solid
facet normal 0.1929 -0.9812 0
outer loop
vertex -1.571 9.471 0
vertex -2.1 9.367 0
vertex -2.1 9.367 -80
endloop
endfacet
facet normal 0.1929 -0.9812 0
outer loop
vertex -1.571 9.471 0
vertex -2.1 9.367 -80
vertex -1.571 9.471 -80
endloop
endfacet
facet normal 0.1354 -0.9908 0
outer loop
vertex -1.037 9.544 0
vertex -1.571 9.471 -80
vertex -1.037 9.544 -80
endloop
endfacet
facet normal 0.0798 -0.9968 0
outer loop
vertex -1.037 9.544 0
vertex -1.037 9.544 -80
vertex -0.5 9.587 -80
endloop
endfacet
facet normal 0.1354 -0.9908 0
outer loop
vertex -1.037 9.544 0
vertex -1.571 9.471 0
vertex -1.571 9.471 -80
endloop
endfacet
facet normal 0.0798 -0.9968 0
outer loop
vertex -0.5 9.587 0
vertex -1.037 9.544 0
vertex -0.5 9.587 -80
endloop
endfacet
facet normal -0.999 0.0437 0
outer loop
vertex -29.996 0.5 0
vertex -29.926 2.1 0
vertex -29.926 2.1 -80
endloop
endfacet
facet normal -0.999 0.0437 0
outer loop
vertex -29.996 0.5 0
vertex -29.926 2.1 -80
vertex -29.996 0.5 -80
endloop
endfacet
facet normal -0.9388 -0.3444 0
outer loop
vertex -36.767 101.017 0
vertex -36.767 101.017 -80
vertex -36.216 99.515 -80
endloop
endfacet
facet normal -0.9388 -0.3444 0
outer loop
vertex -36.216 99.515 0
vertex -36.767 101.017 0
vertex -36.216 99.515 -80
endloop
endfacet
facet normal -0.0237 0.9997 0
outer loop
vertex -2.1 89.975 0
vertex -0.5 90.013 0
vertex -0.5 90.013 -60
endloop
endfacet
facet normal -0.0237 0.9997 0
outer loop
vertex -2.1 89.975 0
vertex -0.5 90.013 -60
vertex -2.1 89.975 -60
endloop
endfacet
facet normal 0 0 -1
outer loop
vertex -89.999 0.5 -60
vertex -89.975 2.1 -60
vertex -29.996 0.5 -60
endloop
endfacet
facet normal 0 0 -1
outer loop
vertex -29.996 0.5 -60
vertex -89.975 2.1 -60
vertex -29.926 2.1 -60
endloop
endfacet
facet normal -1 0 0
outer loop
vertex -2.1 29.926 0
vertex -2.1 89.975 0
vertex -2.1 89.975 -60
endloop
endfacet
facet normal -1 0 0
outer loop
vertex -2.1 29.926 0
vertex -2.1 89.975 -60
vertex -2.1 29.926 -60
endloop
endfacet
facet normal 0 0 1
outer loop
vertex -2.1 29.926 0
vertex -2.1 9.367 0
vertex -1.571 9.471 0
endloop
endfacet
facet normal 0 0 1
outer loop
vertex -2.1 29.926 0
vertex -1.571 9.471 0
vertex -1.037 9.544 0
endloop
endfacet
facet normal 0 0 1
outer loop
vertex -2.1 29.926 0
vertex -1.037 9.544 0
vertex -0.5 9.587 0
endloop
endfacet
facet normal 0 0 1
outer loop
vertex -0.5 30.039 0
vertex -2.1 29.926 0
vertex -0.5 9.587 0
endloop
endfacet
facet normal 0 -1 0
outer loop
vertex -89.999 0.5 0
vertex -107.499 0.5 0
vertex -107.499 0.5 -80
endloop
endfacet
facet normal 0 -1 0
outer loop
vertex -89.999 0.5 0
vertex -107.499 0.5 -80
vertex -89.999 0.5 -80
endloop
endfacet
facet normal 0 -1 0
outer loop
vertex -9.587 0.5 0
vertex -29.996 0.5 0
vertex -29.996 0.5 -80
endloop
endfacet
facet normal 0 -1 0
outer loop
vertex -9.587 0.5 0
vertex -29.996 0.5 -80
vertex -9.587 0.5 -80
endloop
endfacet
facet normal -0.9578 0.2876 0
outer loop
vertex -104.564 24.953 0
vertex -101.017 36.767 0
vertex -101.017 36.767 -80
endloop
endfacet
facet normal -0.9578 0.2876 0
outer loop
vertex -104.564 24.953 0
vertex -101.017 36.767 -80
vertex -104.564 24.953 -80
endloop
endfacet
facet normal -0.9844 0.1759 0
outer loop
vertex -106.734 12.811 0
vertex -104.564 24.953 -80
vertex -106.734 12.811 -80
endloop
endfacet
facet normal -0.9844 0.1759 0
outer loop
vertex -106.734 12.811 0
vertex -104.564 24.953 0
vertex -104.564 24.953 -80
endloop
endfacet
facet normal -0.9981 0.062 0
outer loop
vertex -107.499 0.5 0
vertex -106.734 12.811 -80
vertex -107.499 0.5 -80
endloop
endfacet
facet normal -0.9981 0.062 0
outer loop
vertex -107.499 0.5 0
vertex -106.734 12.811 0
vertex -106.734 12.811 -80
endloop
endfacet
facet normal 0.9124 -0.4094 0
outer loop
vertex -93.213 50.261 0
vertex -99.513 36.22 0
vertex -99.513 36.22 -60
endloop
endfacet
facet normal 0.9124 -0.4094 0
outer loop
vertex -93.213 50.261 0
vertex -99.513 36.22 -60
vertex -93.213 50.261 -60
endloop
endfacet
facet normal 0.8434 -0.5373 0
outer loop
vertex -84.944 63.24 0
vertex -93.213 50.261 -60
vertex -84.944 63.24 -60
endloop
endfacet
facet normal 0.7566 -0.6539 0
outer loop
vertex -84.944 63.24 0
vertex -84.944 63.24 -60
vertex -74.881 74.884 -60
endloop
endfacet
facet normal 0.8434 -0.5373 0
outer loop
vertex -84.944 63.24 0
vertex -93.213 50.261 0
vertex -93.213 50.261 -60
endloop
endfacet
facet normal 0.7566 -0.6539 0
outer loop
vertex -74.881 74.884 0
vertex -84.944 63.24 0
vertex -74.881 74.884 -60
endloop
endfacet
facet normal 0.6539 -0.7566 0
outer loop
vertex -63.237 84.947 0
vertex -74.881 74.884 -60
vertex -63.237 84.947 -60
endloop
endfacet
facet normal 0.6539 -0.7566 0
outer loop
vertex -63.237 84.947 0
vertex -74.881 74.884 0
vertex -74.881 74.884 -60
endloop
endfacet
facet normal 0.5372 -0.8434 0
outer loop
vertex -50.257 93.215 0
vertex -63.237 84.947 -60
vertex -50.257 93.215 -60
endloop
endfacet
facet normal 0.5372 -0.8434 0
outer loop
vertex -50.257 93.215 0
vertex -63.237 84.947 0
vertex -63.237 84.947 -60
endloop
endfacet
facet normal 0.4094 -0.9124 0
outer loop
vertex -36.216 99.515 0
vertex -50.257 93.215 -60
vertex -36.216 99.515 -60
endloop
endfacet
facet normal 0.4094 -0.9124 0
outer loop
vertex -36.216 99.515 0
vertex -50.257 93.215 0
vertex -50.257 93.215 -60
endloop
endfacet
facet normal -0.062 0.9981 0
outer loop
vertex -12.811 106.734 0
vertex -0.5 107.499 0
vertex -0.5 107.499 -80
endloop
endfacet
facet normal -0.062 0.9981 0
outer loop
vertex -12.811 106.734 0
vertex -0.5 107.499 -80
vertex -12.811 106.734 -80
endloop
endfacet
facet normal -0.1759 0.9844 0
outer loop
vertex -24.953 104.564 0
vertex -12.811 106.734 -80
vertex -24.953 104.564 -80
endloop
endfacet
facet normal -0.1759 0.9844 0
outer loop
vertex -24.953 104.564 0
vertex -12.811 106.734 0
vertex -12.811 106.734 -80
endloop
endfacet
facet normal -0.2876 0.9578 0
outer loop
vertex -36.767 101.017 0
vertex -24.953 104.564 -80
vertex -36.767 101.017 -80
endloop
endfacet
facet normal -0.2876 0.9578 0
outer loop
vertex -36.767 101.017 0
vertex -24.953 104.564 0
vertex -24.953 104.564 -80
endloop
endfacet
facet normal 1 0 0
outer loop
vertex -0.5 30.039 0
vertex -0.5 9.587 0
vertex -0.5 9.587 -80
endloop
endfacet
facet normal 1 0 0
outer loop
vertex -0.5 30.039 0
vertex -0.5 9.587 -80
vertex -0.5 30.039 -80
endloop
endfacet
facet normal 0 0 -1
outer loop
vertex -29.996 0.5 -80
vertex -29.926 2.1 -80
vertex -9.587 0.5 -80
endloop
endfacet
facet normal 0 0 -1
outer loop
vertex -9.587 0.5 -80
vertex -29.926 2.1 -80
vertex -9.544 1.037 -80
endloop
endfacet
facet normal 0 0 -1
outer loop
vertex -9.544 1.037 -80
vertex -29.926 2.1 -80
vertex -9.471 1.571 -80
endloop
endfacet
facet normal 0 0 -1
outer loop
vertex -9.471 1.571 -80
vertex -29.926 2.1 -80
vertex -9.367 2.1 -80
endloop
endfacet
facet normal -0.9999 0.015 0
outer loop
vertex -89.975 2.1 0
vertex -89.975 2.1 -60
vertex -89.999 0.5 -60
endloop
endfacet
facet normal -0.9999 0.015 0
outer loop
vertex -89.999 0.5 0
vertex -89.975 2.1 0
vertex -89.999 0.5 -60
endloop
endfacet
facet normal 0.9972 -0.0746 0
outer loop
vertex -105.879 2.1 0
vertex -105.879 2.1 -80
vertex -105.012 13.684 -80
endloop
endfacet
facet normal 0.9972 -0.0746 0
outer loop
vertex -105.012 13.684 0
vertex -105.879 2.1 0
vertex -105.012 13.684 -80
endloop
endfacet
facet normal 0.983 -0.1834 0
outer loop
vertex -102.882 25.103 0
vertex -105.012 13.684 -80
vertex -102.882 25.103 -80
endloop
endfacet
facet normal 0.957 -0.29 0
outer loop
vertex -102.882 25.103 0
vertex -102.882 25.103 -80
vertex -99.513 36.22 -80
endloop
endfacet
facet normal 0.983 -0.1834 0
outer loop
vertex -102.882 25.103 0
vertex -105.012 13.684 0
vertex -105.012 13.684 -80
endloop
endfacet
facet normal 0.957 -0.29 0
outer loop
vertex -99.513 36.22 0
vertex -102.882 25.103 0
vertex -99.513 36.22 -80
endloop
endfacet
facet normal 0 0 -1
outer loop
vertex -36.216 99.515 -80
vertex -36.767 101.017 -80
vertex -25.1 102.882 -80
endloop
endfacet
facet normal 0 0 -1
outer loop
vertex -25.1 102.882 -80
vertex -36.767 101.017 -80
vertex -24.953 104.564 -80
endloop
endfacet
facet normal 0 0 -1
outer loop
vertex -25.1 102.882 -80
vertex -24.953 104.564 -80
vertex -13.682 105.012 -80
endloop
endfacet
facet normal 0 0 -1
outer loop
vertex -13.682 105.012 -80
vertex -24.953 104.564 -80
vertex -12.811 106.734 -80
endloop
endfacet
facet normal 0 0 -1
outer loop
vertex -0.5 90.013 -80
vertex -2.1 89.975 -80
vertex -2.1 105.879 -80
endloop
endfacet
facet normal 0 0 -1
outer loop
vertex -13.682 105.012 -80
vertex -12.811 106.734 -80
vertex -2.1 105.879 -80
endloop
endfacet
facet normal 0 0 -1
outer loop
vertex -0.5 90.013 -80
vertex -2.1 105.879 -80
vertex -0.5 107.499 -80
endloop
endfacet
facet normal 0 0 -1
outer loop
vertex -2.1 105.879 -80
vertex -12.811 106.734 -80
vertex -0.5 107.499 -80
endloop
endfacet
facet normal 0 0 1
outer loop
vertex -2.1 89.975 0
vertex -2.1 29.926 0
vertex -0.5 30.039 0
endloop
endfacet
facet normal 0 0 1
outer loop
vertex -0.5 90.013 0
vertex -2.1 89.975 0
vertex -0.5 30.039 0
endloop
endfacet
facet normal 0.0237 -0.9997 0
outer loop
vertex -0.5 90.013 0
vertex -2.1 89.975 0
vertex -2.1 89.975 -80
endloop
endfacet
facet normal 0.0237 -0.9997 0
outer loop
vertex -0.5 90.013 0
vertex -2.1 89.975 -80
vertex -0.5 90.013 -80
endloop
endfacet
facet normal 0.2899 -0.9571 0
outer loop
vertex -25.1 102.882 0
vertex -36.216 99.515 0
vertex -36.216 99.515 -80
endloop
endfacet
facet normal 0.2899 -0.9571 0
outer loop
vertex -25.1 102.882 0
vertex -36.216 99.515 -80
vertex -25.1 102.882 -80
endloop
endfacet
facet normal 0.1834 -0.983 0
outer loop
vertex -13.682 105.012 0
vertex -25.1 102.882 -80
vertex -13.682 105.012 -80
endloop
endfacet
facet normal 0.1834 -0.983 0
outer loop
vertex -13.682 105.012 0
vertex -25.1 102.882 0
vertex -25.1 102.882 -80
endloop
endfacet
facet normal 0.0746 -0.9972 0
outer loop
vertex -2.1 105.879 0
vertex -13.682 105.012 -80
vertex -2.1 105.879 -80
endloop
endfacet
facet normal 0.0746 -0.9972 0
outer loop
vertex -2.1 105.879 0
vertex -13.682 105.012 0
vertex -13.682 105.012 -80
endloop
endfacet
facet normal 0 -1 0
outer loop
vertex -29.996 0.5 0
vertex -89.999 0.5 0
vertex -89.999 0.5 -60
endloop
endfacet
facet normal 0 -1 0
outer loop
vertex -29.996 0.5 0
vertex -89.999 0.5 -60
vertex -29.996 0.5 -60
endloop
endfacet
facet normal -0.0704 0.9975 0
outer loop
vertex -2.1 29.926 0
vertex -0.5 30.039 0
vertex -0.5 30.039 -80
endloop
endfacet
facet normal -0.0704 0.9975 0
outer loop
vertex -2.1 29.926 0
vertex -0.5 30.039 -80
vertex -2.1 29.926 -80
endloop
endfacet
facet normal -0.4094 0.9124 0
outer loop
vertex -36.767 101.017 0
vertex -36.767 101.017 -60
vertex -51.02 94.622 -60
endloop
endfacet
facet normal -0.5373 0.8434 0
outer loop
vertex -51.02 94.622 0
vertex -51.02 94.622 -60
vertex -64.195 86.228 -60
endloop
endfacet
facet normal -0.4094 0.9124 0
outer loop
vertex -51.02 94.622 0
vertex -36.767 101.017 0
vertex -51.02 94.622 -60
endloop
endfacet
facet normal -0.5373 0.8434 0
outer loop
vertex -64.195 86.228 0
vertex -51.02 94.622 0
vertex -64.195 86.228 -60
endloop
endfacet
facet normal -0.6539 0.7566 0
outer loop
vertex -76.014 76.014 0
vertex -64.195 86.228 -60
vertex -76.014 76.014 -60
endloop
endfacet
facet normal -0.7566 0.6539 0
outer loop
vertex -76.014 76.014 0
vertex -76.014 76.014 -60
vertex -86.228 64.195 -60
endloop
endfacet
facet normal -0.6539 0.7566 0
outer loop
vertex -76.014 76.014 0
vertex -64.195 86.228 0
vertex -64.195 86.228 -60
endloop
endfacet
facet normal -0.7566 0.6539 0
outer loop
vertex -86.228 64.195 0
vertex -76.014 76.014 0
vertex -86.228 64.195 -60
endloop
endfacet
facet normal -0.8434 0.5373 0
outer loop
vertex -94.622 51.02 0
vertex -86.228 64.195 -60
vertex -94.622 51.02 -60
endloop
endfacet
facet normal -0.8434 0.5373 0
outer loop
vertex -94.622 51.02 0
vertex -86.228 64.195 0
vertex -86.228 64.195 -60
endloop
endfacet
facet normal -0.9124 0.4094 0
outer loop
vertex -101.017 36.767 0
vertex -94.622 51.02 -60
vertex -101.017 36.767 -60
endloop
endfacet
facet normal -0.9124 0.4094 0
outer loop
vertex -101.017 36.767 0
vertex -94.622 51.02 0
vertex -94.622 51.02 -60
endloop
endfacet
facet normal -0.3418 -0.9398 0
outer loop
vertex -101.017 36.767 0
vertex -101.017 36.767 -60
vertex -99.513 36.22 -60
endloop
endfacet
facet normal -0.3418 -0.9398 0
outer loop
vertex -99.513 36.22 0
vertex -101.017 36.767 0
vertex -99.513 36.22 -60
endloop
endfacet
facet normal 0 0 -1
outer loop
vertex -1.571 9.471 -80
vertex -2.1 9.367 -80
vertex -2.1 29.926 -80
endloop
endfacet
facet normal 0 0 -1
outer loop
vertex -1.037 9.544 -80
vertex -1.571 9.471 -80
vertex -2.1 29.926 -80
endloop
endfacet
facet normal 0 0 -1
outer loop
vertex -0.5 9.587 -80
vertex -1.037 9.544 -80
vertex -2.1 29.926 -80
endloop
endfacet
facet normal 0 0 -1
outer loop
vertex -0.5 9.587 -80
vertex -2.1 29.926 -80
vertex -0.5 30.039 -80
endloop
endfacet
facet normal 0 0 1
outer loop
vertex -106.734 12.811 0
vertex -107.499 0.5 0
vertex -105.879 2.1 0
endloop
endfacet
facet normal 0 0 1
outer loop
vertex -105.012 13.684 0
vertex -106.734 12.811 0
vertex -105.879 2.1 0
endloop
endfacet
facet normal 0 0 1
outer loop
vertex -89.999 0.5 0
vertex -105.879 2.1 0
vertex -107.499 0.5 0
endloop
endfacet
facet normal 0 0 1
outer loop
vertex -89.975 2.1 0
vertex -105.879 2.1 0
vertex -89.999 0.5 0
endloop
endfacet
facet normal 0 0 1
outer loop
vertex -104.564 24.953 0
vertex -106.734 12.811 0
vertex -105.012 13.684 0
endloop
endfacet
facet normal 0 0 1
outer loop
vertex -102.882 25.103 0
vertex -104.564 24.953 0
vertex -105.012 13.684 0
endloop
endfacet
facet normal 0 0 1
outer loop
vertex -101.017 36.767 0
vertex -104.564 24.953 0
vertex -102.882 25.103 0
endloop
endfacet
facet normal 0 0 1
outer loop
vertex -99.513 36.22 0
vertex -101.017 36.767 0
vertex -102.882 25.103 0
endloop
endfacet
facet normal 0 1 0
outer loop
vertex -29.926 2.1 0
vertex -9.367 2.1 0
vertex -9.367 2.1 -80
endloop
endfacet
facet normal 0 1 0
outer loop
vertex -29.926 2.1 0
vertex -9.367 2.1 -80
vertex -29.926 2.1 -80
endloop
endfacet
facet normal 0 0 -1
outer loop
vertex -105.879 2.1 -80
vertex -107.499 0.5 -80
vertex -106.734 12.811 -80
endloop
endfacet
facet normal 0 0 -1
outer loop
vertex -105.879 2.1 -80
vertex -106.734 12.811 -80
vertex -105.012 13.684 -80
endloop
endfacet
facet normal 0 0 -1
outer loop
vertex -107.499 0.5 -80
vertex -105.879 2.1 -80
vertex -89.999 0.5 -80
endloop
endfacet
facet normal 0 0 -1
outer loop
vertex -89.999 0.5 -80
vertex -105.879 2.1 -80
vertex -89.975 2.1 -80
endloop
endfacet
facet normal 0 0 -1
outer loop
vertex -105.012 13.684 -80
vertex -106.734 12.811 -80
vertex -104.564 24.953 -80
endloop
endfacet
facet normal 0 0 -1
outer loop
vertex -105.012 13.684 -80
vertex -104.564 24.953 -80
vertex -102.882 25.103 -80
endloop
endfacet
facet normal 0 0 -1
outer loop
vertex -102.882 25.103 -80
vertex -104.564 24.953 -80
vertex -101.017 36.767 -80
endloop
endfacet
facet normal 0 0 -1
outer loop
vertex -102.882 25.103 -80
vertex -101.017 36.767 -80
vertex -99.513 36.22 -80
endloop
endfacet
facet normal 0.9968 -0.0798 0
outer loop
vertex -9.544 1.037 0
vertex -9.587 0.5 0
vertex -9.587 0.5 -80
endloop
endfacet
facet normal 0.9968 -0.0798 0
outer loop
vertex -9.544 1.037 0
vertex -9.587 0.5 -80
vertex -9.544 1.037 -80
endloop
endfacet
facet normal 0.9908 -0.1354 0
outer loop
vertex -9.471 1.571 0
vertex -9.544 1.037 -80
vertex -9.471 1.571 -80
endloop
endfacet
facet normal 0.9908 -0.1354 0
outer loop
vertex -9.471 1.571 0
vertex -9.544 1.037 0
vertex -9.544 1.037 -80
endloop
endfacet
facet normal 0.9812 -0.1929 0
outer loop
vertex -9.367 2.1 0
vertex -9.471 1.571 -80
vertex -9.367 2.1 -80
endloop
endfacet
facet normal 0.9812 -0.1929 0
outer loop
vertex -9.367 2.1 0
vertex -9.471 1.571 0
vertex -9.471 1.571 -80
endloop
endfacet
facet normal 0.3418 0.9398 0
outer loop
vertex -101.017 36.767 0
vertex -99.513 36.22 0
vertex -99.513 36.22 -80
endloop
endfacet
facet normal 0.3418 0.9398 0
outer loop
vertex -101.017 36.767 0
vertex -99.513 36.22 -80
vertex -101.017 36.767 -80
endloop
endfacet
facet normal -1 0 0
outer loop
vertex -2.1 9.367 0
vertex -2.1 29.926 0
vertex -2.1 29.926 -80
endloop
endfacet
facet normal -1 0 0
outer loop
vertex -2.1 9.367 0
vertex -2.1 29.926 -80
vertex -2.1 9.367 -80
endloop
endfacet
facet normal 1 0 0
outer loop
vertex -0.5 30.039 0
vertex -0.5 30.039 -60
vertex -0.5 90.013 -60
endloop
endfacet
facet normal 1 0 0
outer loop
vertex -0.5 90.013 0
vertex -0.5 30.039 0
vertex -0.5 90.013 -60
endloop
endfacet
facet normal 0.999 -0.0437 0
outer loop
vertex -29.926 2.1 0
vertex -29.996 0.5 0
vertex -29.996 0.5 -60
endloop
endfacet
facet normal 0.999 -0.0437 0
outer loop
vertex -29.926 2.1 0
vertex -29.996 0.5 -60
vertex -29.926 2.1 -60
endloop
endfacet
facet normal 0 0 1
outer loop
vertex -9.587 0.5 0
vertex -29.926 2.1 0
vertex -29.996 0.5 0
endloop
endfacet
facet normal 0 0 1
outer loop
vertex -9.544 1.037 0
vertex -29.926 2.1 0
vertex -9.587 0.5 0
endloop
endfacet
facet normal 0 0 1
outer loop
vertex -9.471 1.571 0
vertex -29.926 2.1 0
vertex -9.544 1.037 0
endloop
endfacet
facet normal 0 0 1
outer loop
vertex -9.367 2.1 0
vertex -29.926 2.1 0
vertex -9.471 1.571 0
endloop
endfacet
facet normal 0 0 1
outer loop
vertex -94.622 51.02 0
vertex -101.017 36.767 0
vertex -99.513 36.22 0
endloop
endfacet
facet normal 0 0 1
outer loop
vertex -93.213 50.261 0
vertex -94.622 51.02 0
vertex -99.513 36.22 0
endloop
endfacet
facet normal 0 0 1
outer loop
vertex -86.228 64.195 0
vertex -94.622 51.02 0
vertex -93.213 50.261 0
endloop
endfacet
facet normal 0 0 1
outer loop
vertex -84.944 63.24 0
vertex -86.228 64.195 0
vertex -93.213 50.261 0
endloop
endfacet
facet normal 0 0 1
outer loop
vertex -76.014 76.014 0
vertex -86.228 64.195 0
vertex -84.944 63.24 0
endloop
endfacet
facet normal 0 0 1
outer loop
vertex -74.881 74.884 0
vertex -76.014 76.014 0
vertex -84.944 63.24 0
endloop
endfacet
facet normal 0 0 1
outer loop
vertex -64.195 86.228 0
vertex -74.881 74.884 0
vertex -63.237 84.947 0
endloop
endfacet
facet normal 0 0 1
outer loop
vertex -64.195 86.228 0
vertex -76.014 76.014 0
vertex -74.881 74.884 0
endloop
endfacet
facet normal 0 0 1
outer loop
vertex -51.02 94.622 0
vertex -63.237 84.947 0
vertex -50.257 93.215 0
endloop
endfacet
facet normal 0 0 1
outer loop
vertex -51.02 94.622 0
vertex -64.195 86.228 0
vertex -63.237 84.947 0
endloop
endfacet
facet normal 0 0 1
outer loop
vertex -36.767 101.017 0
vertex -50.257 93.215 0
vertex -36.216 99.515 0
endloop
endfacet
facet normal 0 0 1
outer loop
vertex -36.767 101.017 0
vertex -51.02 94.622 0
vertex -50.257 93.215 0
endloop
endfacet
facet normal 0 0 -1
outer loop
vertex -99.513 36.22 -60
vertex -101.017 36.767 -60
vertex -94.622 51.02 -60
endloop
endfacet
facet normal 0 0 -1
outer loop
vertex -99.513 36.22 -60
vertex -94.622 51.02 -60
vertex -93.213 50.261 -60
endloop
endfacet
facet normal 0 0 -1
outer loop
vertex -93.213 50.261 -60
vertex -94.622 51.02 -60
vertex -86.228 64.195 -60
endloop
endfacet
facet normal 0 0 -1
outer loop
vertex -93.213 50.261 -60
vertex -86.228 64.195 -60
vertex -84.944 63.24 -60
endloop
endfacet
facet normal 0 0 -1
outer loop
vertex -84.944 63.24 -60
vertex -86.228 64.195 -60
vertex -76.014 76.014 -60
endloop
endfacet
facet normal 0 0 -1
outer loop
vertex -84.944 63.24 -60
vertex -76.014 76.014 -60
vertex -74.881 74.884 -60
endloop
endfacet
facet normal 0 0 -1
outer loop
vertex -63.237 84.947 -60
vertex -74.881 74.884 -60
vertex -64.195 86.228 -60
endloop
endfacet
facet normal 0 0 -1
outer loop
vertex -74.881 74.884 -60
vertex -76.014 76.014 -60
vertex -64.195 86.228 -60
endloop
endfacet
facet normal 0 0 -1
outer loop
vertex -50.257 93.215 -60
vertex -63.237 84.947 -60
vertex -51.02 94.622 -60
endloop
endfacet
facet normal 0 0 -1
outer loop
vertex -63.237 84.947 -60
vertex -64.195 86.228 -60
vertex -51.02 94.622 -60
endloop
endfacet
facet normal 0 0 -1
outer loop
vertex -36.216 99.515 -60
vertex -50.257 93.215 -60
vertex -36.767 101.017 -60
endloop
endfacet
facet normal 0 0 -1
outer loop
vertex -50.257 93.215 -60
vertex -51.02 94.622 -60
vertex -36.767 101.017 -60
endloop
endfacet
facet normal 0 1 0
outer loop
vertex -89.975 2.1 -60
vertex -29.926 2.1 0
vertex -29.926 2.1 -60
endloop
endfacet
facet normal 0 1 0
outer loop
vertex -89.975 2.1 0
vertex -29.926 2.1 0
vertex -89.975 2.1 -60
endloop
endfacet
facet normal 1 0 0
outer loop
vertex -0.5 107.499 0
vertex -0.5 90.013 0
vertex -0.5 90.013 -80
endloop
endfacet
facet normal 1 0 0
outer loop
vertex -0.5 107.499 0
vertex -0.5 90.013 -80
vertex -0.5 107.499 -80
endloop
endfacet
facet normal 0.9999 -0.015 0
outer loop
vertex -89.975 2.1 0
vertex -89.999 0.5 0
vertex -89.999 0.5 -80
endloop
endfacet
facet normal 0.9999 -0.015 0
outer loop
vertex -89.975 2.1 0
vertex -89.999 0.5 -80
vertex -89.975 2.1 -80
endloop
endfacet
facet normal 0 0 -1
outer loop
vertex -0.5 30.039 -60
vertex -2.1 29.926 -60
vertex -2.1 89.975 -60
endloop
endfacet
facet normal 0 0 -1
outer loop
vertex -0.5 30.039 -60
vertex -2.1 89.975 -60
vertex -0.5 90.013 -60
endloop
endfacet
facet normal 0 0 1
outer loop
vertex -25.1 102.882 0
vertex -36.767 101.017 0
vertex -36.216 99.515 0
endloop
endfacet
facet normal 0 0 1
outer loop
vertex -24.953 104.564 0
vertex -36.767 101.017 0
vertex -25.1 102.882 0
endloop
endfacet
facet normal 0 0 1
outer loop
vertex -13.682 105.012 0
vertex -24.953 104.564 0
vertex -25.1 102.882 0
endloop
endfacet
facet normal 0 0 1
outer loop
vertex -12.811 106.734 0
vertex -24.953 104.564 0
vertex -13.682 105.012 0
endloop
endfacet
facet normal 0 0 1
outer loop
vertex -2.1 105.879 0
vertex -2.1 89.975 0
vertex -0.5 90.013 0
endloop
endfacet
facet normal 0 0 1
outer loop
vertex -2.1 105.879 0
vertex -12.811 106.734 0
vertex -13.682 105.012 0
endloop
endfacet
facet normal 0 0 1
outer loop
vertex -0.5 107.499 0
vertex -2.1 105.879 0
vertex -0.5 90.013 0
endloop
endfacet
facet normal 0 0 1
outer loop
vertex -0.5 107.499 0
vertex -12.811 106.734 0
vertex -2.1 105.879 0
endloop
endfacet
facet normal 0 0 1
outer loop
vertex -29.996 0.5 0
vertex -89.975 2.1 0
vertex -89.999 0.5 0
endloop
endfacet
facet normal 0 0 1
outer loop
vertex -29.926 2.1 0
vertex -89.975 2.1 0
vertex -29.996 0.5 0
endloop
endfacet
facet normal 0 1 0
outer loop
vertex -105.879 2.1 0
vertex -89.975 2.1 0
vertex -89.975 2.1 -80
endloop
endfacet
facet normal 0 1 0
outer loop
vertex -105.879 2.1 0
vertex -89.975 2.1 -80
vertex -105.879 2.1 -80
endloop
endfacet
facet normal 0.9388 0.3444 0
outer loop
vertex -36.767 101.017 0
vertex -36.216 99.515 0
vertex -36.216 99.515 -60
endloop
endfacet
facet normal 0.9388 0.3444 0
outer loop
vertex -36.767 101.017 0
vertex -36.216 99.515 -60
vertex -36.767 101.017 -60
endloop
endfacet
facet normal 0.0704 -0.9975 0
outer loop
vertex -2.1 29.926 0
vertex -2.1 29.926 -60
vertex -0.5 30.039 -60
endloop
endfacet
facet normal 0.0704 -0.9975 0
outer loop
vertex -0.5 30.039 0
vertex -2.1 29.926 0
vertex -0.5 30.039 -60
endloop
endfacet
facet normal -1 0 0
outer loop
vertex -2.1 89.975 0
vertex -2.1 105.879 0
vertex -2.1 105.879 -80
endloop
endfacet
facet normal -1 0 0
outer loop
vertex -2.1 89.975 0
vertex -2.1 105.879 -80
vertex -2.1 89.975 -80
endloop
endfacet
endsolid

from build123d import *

# Parameters (mm, degrees)
F1_DEPTH = 80
F2_DEPTH = 60


with BuildPart() as f1:
    # F0 (on Top) → F1 (new body)
    with BuildSketch(Plane.XY):
        with BuildLine():
            Line((-2.1, 89.975497), (-0.5, 90.01284))
            Line((-0.5, 90.01284), (-0.5, 107.498837))
            ThreePointArc((-0.5, 107.498837), (-18.913331, 105.823135), (-36.767165, 101.016957))
            Line((-36.767165, 101.016957), (-36.215717, 99.514983))
            ThreePointArc((-36.215717, 99.514983), (-19.420332, 104.104086), (-2.1, 105.879176))
            Line((-2.1, 105.879176), (-2.1, 89.975497))
        make_face()
        with BuildLine():
            ThreePointArc((-2.1, 9.367497), (-1.304623, 9.510939), (-0.5, 9.58697))
            Line((-0.5, 9.58697), (-0.5, 30.038685))
            Line((-0.5, 30.038685), (-2.1, 29.92641))
            Line((-2.1, 29.92641), (-2.1, 9.367497))
        make_face()
        with BuildLine():
            Line((-29.995833, 0.5), (-9.58697, 0.5))
            ThreePointArc((-9.58697, 0.5), (-9.510939, 1.304623), (-9.367497, 2.1))
            Line((-9.367497, 2.1), (-29.92641, 2.1))
            Line((-29.92641, 2.1), (-29.995833, 0.5))
        make_face()
        with BuildLine():
            Line((-107.498837, 0.5), (-89.998611, 0.5))
            Line((-89.998611, 0.5), (-89.975371, 2.1))
            Line((-89.975371, 2.1), (-105.879176, 2.1))
            ThreePointArc((-105.879176, 2.1), (-104.103675, 19.422537), (-99.513449, 36.219933))
            Line((-99.513449, 36.219933), (-101.016957, 36.767165))
            ThreePointArc((-101.016957, 36.767165), (-105.823135, 18.913331), (-107.498837, 0.5))
        make_face()
    extrude(amount=-F1_DEPTH)


with BuildPart() as f2:
    # F0 (on Top) → F2 (new body)
    with BuildSketch(Plane.XY):
        Polygon((-89.998611, 0.5), (-29.995833, 0.5), (-29.92641, 2.1), (-89.975371, 2.1), align=None)
        Polygon((-2.1, 29.92641), (-0.5, 30.038685), (-0.5, 90.01284), (-2.1, 89.975497), align=None)
        with BuildLine():
            Line((-36.215717, 99.514983), (-36.767165, 101.016957))
            ThreePointArc((-36.767165, 101.016957), (-76.013979, 76.013979), (-101.016957, 36.767165))
            Line((-101.016957, 36.767165), (-99.513449, 36.219933))
            ThreePointArc((-99.513449, 36.219933), (-74.881022, 74.884194), (-36.215717, 99.514983))
        make_face()
    extrude(amount=-F2_DEPTH)


solid = Compound([f1.part, f2.part])
